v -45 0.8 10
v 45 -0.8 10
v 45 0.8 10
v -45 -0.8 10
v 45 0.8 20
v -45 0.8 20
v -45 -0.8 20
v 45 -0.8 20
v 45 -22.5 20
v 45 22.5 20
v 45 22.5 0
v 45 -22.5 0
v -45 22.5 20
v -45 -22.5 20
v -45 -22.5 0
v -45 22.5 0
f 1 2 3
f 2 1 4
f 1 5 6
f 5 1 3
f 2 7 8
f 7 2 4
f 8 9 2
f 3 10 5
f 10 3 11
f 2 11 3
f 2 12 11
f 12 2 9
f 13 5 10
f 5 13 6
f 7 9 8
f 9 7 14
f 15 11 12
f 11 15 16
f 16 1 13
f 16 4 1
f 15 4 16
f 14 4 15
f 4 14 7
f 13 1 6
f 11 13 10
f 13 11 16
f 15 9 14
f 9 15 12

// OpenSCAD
// Microscope slide drying rack
// Print orientation: base block on the bed (z = 0), slots open upward (+Z)

// ---------------- Parameters ----------------
block_len    = 90;    // base block length along X (mm)
block_wid    = 45;    // base block width along Y (mm)
block_h      = 20;    // base block height along Z (mm)

slot_count   = 10;    // number of slide slots
slot_len     = 77;    // slot length along X (mm)
slot_w       = 1.6;   // slot width along Y (mm)
slot_depth   = 10;    // slot depth from top face (mm)
slot_pitch   = 3.5;   // centre-to-centre slot spacing along Y (mm)

eps          = 0.5;   // overshoot of cutters past the top face (mm)

$fn = 64;

// ---------------- Model ----------------
difference() {
    // Base block, centred in X and Y, sitting on z = 0
    translate([-block_len / 2, -block_wid / 2, 0])
        cube([block_len, block_wid, block_h]);

    // Parallel slots, centred as a group in X and Y
    for (i = [0 : slot_count - 1]) {
        x = (i - (slot_count - 1) / 2) * slot_pitch;
        translate([x - slot_len / 2, -slot_w / 2, block_h - slot_depth])
            cube([slot_len, slot_w, slot_depth + eps]);
    }
}
